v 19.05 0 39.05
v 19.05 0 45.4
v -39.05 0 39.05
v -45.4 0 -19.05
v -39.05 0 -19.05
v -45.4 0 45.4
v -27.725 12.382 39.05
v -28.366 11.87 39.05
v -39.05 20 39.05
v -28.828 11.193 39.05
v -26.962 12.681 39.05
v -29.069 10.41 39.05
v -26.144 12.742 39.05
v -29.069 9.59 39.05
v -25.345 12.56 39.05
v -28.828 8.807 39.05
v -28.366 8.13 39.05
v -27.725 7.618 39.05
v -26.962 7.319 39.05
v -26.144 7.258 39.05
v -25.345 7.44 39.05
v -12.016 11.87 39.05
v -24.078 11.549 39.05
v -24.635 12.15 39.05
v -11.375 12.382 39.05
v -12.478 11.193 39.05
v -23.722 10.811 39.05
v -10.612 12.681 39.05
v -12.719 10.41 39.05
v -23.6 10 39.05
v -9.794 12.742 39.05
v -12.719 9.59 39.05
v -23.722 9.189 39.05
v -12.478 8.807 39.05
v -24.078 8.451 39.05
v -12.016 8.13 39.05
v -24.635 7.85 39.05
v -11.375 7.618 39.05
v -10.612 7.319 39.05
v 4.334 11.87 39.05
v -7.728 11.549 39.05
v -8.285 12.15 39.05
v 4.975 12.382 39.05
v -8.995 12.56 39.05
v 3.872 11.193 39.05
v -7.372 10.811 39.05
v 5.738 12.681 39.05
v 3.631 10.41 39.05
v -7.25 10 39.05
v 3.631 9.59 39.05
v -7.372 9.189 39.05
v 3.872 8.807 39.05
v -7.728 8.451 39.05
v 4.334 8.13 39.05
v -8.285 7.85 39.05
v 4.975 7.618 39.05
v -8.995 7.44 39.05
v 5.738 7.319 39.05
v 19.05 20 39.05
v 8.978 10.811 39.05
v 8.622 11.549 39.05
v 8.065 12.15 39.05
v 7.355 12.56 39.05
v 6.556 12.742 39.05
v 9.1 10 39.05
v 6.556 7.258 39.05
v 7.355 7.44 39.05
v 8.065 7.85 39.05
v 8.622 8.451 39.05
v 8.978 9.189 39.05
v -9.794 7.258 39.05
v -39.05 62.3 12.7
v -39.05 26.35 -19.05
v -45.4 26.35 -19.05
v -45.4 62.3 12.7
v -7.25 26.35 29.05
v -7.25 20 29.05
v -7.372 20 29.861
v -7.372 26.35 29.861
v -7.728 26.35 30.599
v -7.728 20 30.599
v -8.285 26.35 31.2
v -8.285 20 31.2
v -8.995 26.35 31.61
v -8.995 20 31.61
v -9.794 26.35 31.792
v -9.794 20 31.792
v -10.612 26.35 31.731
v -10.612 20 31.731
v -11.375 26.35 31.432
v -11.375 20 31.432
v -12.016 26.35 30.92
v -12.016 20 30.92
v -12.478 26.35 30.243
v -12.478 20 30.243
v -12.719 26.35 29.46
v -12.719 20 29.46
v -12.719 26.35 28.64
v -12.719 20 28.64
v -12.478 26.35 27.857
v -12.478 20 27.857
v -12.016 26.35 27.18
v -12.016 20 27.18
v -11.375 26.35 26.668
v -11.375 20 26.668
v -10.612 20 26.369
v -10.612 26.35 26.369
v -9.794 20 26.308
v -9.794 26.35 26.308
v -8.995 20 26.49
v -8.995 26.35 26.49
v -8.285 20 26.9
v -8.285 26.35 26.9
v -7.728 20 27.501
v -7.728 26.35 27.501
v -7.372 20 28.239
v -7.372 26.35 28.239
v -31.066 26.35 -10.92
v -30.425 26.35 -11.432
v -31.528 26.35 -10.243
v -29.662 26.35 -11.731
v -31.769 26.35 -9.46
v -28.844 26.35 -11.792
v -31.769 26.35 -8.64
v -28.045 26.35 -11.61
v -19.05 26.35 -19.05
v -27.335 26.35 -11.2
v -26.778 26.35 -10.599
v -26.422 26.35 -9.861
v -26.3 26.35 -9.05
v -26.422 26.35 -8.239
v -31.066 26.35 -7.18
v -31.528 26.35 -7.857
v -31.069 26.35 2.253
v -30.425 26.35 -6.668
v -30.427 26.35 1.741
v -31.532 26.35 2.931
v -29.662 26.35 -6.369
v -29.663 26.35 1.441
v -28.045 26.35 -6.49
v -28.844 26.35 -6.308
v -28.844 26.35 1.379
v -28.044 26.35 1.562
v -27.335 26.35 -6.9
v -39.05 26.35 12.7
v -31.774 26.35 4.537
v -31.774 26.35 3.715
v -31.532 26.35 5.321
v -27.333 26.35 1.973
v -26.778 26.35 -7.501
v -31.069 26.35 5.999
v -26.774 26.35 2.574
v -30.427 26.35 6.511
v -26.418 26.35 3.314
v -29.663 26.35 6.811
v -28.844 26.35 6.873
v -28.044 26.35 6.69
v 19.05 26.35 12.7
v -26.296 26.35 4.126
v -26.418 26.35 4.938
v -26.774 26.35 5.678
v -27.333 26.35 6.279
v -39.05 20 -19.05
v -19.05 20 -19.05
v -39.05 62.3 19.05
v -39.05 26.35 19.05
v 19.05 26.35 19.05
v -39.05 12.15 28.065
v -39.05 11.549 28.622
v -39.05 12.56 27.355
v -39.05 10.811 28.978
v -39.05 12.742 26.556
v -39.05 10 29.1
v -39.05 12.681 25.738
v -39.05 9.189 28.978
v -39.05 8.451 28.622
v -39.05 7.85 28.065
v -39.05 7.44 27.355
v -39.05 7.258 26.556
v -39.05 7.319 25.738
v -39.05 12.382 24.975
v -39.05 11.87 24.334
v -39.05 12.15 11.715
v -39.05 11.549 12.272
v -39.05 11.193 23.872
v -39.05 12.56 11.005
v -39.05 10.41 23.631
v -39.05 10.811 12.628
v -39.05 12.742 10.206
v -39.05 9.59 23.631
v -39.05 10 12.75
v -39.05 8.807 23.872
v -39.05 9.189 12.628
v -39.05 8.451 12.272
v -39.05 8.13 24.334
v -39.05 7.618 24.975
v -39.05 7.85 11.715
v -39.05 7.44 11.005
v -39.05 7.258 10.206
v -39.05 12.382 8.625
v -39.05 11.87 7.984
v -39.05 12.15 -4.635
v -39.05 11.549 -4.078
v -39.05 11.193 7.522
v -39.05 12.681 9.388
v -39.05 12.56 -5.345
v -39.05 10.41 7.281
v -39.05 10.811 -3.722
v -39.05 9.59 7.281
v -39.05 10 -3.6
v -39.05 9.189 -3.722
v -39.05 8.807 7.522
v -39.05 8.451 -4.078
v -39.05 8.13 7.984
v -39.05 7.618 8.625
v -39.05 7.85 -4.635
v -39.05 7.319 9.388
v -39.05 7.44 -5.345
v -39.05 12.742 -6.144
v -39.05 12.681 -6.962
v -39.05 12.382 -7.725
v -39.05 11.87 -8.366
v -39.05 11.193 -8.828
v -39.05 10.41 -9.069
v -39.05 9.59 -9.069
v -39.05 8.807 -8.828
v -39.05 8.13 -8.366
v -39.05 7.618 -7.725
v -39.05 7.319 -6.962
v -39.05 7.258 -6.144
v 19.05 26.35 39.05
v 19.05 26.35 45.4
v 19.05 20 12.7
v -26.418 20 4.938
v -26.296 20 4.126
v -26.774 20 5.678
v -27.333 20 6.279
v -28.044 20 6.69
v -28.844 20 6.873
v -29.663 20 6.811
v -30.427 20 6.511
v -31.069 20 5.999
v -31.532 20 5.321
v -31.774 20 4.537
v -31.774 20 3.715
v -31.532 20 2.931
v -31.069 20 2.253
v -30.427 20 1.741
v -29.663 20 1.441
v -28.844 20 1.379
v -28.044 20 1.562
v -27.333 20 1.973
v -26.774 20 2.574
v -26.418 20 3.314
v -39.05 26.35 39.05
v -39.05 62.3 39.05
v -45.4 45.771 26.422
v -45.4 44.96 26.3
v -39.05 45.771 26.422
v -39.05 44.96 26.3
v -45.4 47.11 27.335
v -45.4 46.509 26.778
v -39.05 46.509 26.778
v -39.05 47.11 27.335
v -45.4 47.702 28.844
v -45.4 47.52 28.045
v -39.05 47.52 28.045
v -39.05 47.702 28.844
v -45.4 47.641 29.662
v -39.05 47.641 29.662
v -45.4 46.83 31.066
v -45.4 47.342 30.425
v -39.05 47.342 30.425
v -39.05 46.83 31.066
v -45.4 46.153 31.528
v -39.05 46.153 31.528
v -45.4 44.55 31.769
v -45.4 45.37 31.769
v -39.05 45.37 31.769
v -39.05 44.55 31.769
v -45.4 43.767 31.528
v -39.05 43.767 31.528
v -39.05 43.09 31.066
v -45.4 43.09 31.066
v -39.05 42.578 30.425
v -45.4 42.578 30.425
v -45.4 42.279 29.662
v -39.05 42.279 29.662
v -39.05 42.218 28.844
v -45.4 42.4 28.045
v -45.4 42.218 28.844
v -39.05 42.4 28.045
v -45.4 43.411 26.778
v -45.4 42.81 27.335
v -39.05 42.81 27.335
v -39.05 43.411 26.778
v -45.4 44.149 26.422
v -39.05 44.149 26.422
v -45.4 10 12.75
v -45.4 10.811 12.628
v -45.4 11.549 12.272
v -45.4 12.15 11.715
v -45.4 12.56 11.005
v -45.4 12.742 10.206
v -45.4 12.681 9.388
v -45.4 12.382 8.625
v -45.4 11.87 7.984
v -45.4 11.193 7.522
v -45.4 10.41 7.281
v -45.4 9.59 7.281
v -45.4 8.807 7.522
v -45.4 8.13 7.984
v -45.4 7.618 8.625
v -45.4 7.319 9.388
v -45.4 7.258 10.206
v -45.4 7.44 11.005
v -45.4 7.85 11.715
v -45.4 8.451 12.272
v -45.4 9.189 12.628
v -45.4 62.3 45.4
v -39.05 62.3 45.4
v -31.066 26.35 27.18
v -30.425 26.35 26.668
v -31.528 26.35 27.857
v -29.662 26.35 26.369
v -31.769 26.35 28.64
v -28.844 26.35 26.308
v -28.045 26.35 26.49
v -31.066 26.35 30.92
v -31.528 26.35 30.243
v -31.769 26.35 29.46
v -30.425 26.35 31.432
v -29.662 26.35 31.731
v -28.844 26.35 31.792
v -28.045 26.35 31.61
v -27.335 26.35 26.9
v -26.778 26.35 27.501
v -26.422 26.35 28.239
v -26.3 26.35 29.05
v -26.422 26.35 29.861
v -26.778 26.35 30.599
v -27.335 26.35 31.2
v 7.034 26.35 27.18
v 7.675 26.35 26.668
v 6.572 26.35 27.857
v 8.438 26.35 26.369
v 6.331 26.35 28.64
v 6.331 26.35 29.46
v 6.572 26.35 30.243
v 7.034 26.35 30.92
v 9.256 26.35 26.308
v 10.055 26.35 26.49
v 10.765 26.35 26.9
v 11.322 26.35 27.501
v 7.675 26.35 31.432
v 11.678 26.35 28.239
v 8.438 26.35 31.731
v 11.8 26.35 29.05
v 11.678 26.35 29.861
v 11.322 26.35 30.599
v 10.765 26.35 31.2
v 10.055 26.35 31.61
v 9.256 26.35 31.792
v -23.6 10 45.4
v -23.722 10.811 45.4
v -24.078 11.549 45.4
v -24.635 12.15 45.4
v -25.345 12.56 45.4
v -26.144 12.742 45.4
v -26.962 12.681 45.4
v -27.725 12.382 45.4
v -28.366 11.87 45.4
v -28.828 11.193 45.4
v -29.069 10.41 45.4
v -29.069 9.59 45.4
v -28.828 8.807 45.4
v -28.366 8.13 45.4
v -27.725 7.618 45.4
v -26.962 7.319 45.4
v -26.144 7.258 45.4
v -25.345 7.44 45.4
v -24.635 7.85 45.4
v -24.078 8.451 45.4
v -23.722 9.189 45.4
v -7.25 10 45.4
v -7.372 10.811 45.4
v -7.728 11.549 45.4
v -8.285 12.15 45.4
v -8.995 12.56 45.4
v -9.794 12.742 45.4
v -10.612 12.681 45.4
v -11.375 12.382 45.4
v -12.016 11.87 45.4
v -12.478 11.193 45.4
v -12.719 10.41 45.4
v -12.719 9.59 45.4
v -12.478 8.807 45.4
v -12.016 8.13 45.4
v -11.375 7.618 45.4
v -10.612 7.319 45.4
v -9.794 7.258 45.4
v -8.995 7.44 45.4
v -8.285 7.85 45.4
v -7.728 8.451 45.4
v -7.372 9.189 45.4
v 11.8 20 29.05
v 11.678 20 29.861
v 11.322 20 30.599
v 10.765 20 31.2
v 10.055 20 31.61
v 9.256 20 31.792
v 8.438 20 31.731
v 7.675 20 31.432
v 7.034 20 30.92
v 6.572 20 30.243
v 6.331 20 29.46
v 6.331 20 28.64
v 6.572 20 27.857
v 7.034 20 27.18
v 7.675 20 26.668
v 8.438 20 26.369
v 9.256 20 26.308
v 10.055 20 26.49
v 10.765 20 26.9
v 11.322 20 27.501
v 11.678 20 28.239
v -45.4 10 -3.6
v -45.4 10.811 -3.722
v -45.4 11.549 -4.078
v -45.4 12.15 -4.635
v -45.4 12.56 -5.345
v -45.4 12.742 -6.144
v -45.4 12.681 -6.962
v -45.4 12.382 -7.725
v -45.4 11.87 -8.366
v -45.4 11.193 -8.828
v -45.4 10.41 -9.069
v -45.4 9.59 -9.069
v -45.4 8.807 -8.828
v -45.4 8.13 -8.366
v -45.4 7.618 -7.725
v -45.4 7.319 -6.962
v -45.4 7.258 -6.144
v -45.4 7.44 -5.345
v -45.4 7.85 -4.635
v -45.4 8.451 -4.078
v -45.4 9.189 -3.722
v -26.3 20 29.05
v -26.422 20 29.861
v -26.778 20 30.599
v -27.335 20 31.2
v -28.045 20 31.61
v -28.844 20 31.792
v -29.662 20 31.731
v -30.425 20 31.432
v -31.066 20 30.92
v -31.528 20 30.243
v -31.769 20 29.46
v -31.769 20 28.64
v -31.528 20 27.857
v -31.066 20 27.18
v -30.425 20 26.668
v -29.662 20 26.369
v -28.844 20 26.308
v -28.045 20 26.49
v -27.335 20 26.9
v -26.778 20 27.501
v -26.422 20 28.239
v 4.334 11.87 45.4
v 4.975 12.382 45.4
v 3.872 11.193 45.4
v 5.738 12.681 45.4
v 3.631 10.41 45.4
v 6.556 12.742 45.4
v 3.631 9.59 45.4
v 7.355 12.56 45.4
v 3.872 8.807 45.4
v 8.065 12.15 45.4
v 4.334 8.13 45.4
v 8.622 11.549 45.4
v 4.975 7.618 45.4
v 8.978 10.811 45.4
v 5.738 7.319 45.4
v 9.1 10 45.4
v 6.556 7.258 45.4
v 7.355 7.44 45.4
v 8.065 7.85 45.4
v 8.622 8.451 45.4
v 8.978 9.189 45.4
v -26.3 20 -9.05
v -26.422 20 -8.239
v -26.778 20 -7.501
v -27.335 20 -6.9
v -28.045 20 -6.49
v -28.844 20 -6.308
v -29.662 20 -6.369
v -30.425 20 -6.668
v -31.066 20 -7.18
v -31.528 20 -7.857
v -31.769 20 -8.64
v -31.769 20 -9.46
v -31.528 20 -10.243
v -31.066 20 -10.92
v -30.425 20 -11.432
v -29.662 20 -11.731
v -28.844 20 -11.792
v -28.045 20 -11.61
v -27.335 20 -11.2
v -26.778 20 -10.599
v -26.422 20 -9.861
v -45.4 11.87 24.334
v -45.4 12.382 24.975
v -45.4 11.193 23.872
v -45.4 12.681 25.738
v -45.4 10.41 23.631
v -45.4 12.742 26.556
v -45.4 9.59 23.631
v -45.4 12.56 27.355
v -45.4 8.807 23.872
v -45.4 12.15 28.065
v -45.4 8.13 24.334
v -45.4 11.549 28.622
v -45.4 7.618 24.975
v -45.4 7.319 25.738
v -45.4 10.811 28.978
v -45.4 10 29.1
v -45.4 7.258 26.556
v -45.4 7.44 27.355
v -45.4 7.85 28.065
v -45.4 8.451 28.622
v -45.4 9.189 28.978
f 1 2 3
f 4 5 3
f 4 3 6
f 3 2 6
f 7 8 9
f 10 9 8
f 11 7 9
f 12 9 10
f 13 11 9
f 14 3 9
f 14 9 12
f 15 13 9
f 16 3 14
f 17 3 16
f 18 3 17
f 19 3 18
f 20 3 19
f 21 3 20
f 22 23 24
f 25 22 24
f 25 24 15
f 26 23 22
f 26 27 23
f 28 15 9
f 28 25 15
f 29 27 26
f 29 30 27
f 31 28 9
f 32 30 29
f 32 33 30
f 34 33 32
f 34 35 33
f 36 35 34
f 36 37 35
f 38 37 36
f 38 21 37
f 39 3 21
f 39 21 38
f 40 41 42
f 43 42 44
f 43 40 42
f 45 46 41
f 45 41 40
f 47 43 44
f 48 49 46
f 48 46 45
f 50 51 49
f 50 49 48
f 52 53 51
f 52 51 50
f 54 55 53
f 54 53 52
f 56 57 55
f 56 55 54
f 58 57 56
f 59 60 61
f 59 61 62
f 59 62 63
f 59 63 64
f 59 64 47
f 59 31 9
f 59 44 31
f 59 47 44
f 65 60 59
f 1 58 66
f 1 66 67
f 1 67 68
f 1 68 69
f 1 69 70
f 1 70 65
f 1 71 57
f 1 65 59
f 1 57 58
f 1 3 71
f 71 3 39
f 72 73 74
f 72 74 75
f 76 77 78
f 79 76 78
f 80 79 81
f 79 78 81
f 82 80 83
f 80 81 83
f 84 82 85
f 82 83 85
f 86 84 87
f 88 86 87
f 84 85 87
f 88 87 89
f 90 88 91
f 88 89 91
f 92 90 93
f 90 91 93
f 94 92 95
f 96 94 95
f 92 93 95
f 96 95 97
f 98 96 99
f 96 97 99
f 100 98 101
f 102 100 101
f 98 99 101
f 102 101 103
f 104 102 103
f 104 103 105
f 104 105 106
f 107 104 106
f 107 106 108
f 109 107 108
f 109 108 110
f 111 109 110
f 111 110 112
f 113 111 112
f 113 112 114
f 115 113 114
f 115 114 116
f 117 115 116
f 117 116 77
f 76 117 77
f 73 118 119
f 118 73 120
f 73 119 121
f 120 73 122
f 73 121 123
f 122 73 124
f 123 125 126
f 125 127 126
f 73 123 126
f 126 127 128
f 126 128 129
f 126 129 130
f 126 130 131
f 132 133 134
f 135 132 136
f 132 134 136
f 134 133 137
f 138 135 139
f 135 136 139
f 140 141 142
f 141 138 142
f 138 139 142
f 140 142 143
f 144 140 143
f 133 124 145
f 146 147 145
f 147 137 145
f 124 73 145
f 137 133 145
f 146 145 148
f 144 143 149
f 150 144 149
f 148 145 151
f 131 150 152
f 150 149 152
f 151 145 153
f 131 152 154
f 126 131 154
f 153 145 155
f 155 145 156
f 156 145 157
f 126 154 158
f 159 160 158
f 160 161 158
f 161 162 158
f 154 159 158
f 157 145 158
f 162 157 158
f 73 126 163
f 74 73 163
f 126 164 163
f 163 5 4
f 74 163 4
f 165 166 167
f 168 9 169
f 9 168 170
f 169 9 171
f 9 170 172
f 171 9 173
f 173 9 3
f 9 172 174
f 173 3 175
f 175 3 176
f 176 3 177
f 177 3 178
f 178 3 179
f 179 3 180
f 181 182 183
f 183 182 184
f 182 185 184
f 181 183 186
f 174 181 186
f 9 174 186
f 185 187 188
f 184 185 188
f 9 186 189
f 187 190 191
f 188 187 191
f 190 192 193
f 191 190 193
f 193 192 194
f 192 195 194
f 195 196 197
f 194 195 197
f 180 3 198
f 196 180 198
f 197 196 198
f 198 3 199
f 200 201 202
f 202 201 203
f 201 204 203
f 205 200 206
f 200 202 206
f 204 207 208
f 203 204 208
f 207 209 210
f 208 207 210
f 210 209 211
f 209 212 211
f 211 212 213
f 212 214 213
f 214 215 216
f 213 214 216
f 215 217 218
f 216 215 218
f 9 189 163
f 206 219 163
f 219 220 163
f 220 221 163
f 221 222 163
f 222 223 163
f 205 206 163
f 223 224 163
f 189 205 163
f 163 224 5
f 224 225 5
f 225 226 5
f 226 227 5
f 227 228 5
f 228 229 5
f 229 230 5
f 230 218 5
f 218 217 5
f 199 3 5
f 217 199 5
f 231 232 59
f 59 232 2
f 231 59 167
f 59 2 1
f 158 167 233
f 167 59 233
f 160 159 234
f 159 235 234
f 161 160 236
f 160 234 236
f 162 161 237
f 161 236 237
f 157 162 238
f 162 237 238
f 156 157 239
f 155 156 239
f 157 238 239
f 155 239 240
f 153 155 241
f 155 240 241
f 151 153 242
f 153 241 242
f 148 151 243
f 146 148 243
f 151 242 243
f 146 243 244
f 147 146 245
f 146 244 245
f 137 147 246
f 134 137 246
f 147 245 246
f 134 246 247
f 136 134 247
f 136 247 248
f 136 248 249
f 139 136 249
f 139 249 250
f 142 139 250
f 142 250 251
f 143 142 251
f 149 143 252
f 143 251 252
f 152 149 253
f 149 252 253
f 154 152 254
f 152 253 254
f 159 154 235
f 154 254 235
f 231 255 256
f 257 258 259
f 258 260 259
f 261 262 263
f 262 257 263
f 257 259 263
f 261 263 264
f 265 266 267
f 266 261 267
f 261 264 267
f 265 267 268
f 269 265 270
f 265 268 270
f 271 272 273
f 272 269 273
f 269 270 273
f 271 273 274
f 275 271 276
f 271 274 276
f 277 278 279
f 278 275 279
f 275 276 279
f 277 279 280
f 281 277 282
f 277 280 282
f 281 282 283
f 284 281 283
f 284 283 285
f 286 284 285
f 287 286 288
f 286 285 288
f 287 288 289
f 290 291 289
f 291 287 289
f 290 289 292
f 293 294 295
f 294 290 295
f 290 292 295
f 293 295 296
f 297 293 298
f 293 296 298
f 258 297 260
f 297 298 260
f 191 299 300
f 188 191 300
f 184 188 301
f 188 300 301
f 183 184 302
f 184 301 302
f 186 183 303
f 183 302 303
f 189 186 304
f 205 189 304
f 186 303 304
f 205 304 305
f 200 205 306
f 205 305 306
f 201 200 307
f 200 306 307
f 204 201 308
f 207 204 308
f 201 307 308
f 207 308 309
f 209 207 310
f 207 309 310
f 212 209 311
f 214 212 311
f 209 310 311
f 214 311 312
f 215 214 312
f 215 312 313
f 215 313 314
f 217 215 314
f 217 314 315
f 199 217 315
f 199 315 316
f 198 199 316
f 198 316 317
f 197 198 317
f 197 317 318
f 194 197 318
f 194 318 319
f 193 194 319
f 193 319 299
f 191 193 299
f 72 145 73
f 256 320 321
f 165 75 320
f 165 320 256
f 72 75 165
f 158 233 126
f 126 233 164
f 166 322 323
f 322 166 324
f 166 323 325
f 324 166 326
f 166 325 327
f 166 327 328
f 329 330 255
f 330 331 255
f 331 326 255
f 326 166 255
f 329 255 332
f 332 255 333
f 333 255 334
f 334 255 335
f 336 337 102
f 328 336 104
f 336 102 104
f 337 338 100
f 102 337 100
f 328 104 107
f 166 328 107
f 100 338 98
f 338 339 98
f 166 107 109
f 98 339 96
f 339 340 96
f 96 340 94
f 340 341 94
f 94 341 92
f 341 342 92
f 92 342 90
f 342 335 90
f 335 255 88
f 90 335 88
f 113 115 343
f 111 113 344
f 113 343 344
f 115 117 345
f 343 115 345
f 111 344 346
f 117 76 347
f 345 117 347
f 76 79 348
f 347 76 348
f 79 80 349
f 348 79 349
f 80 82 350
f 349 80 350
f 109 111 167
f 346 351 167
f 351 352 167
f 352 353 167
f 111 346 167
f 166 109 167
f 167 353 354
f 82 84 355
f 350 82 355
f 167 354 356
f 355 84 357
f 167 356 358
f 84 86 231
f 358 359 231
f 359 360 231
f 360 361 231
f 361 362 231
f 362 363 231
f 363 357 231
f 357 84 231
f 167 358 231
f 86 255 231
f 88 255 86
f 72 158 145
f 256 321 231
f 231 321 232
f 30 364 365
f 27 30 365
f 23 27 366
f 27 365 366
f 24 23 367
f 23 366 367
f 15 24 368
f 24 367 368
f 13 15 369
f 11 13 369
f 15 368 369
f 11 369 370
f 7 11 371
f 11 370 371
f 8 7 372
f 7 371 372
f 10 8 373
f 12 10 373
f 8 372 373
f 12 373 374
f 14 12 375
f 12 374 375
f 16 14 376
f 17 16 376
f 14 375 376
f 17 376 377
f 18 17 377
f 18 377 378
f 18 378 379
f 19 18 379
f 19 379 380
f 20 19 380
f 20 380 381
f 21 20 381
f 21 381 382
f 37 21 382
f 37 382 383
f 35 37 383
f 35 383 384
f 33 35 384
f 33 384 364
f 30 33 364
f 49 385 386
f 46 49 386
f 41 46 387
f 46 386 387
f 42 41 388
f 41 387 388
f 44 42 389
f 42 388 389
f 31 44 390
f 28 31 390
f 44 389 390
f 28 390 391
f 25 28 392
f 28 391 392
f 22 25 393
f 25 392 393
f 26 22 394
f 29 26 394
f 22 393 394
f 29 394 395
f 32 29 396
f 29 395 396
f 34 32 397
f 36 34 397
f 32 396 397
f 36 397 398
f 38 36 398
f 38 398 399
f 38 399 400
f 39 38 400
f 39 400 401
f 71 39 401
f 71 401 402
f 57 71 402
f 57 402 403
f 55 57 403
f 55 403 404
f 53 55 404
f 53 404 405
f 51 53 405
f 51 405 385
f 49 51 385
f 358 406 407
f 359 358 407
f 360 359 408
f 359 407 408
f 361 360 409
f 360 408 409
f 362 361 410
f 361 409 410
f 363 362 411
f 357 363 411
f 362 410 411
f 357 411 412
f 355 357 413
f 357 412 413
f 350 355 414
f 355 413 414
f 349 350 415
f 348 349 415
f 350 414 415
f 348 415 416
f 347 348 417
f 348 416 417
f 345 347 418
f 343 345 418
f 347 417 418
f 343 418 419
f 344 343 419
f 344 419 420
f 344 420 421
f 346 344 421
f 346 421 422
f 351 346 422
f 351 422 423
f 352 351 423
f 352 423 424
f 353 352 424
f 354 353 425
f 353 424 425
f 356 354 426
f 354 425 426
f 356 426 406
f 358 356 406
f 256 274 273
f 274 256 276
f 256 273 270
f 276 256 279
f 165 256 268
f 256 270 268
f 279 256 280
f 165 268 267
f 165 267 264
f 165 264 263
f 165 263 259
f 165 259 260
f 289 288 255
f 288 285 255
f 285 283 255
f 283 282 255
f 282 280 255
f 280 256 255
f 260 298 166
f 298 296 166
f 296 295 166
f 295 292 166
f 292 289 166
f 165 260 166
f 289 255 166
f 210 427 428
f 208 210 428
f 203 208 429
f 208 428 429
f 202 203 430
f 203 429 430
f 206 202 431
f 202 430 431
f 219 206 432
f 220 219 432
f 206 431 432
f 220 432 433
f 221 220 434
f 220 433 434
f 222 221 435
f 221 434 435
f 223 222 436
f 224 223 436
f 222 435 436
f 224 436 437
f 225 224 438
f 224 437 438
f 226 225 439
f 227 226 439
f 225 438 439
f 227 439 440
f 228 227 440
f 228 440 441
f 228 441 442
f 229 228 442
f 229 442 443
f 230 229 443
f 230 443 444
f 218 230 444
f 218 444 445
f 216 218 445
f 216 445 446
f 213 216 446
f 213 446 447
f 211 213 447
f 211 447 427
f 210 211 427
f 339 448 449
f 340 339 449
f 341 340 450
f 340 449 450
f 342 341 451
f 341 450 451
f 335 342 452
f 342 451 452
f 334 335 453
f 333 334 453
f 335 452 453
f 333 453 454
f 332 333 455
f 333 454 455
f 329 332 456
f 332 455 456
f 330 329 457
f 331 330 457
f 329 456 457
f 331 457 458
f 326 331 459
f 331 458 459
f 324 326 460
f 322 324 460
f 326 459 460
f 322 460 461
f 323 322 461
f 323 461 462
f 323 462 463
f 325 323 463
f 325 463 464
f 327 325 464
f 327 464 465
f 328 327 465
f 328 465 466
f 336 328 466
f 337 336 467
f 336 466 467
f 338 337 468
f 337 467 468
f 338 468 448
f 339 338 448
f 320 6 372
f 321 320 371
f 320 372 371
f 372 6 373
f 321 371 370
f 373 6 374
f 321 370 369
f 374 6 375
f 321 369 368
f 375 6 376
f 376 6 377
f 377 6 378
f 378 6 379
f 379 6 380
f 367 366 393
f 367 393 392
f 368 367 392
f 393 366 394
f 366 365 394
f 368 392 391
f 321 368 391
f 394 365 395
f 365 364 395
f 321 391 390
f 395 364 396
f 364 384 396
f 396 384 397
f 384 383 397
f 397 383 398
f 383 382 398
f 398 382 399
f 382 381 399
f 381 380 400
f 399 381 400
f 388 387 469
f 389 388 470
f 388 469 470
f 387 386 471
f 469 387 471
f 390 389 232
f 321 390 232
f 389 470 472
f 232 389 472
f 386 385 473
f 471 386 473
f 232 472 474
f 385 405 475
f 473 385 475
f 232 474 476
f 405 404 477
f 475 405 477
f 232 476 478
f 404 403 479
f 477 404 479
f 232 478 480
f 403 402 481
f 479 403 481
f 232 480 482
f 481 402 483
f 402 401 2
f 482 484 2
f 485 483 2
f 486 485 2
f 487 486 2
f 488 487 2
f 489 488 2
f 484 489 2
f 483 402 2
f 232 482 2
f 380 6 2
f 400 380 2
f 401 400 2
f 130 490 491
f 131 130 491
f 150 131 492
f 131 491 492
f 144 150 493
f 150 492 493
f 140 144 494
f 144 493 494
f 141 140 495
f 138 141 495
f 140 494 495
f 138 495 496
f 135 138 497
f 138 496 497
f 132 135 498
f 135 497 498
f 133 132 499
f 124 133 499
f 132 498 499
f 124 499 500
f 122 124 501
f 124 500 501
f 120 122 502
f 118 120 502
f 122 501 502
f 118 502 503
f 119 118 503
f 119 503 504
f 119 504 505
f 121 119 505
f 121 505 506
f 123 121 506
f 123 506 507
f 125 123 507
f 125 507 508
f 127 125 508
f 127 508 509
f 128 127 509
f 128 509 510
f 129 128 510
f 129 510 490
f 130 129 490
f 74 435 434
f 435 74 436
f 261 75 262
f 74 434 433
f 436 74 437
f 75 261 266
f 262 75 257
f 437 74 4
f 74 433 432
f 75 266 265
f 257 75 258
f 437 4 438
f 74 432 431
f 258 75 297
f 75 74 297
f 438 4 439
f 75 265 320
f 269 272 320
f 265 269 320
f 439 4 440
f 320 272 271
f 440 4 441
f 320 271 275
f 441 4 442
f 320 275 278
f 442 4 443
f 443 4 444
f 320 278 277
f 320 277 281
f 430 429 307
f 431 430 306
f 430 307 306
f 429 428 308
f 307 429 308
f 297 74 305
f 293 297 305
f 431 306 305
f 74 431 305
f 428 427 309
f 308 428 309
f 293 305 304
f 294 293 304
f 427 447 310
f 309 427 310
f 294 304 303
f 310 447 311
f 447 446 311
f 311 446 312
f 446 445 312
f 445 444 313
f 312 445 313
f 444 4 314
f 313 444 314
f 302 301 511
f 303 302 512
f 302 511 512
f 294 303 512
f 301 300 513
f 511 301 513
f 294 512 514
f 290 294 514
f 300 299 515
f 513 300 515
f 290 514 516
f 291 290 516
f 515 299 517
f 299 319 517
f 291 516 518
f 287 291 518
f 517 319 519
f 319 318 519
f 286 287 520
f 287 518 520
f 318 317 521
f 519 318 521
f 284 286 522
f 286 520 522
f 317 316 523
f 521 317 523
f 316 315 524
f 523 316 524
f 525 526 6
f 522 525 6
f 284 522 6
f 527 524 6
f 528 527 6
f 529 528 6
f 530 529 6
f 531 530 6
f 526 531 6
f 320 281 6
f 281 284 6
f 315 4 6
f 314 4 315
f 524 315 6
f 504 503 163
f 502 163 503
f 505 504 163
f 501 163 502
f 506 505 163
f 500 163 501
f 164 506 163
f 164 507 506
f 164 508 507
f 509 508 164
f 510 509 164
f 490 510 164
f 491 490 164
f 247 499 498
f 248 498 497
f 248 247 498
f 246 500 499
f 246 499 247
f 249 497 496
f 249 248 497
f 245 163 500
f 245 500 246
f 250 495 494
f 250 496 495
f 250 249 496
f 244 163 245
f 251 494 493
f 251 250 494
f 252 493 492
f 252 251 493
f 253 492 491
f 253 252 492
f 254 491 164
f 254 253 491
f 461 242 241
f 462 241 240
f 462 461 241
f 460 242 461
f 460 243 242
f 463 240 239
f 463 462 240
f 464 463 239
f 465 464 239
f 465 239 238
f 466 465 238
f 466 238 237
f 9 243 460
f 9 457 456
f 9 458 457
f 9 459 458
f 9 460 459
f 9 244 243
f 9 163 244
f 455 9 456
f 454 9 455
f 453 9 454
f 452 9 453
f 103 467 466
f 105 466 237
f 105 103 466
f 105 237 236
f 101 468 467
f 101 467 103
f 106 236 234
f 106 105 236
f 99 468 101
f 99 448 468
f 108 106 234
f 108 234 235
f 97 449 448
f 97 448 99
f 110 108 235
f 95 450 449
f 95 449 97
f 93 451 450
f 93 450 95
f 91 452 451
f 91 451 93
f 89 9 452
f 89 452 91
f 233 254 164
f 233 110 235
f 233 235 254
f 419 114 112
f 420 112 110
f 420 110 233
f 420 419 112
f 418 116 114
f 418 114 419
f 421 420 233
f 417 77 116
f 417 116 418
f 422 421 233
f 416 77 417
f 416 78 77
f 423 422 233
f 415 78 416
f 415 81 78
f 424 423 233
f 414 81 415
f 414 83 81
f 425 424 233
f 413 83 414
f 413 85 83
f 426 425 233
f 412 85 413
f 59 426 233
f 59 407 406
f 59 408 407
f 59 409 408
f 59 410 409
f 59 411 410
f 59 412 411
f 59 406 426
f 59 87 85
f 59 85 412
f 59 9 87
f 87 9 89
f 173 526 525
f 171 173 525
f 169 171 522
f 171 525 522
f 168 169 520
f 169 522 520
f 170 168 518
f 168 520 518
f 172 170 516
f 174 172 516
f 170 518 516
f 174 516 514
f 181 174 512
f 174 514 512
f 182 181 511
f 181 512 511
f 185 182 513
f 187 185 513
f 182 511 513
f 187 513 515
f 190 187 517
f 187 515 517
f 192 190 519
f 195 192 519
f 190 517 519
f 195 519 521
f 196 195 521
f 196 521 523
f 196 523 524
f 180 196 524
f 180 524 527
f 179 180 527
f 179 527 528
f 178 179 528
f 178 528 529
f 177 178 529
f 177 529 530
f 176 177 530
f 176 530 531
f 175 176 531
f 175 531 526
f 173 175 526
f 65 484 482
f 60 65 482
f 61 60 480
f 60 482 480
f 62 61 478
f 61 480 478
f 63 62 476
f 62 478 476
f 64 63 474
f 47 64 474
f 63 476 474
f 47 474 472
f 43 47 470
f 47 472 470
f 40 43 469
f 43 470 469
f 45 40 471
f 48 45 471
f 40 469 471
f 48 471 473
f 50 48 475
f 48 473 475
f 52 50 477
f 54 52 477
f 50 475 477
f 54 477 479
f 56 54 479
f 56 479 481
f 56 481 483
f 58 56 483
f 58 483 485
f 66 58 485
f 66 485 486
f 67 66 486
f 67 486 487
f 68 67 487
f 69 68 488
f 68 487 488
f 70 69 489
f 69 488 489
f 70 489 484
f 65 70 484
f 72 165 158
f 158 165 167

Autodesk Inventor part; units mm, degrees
ref_plane "YZ Plane" through (0, 0, 0) normal (1, 0, 0) x (0, 1, 0)
ref_plane "XZ Plane" through (0, 0, 0) normal (0, 1, 0) x (-1, 0, 0)
sketch "Sketch1" plane through (0, 0, 0) normal (0, 1, 0) x (-1, 0, 0)
  line L0 (-19.05, -19.05) -> (19.05, -19.05) construction
  line L1 (19.05, -19.05) -> (19.05, 19.05) construction
  line L2 (19.05, 19.05) -> (-19.05, 19.05) construction
  line L3 (-19.05, 19.05) -> (-19.05, -19.05) construction
  line L4 (-19.05, -19.05) -> (19.05, 19.05) construction
  line L5 (19.05, -19.05) -> (-19.05, 19.05) construction
  line L6 (-19.05, 19.05) -> (19.05, 19.05) construction
  line L7 (19.05, 19.05) -> (19.05, 39.05) construction
  line L8 (19.05, 39.05) -> (-19.05, 39.05)
  line L9 (-19.05, 39.05) -> (-19.05, 19.05) construction
  line L10 (19.05, 39.05) -> (39.05, 39.05)
  line L11 (39.05, 39.05) -> (39.05, -19.05)
  line L12 (39.05, -19.05) -> (19.05, -19.05) construction
  line L13 (19.05, -19.05) -> (19.05, 19.05) construction
  line L14 (19.05, 19.05) -> (19.05, 39.05) construction
  line L15 (-19.05, 39.05) -> (39.05, 39.05)
  line L16 (45.4, 39.05) -> (45.4, 45.4)
  line L17 (45.4, 45.4) -> (-19.05, 45.4)
  line L18 (-19.05, 45.4) -> (-19.05, 39.05)
  line L19 (45.4, 39.05) -> (39.05, 39.05) construction
  line L20 (39.05, 39.05) -> (39.05, -19.05)
  line L21 (39.05, -19.05) -> (45.4, -19.05)
  line L22 (45.4, -19.05) -> (45.4, 39.05)
  line L23 (39.05, 39.05) -> (45.4, 39.05) construction
  point P0 (0, 0)
  dimension "d0" = 38.1
  dimension "d1" = 20
  dimension "d2" = 20
  dimension "d3" = 6.35
  dimension "d4" = 6.35
  dimension "d67" = 0
extrude "Extrusion1" add sketch "Sketch1" along normal blind 62.3
sketch "Sketch2" plane through (-45.4, 0, 45.4) normal (0, 0, 1) x (1, 0, 0)
  line L0 (6.35, 0) -> (0, 0) projected
  line L1 (64.45, 0) -> (64.45, 62.3) projected
  line L2 (0, 0) -> (64.45, 0)
  line L3 (64.45, 0) -> (64.45, 20)
  line L4 (64.45, 20) -> (0, 20)
  line L5 (0, 20) -> (0, 0)
  line L6 (0, 0) -> (0, 62.3) projected
  line L7 (0, 10) -> (64.45, 10) construction
  circle A0 centre (19.05, 10) radius 2.75
  circle A1 centre (35.4, 10) radius 2.75
  circle A2 centre (51.75, 10) radius 2.75
  point P0 (45.4, 0)
  dimension "d7" = 20
  dimension "d8" = 5.5
  dimension "d12" = 16.35
  dimension "d68" = 12.7
extrude "Extrusion2" cut sketch "Sketch2" against normal blind 62.3 contours A0 | A1 | A2
sketch "Sketch3" plane through (-45.4, 0, -19.05) normal (-1, 0, 0) x (0, 0, 1)
  circle A0 centre (12.7, 10) radius 2.75
  line L0 (0, 0) -> (64.45, 0) projected
  line L1 (0, 0) -> (0, 62.3) projected
  circle A1 centre (29.05, 10) radius 2.75
  circle A2 centre (45.4, 10) radius 2.75
  point P0 (19.05, 0)
  dimension "d19" = 10
  dimension "d20" = 5.5
  dimension "d21" = 12.7
  dimension "d24" = 16.35
extrude "Extrusion3" cut sketch "Sketch3" against normal blind 62.3
ref_plane "Work Plane1" through (0, 20, 0) normal (0, -1, 0) x (1, 0, 0)
sketch "Sketch4" plane through (0, 20, 0) normal (0, -1, 0) x (1, 0, 0)
  line L0 (-39.05, -19.05) -> (-45.4, -19.05) projected
  line L1 (-39.05, 39.05) -> (-39.05, -19.05) projected
  line L2 (19.05, 39.05) -> (-39.05, 39.05) projected
  line L3 (19.05, 45.4) -> (19.05, 39.05) projected
  line L4 (-45.4, 45.4) -> (19.05, 45.4) projected
  line L5 (-45.4, -19.05) -> (-45.4, 45.4) projected
  line L6 (-39.05, 39.05) -> (-39.05, -19.05) projected
  line L7 (-39.05, 39.05) -> (-19.05, 39.05)
  line L8 (-19.05, 39.05) -> (-19.05, 19.05) construction
  line L9 (-19.05, -19.05) -> (-39.05, -19.05)
  line L10 (-39.05, -19.05) -> (-39.05, 39.05)
  line L11 (19.05, 39.05) -> (-39.05, 39.05) projected
  line L12 (19.05, 39.05) -> (-19.05, 39.05)
  line L13 (-19.05, 39.05) -> (-19.05, 19.05) construction
  line L14 (-19.05, 19.05) -> (19.05, 19.05) construction
  line L15 (19.05, 19.05) -> (19.05, 39.05)
  line L16 (-19.05, 19.05) -> (-19.05, -19.05) construction
  line L17 (19.05, 29.05) -> (-39.05, 29.05) construction
  line L18 (-29.05, -19.05) -> (-29.05, 39.05) construction
  circle A0 centre (-29.05, 29.05) radius 2.75
  circle A1 centre (-10, 29.05) radius 2.75
  circle A2 centre (9.05, 29.05) radius 2.75
  circle A3 centre (-29.05, 10) radius 2.75
  circle A4 centre (-29.05, -9.05) radius 2.75
  line L19 (19.05, 19.05) -> (19.05, 12.7)
  line L20 (19.05, 12.7) -> (-19.05, -19.05)
  circle A5 centre (-29.05, 4.126) radius 2.7544
  point P0 (0, 0)
  dimension "d32" = 20
  dimension "d35" = 19.05
  dimension "d40" = 5.5
  dimension "d43" = 19.05
  dimension "d50" = 6.35
  dimension "d69" = 0
extrude "Extrusion4" add sketch "Sketch4" against normal blind 6.35 contours L1 L2 L15 L19 L20 L9 | A3
sketch "Sketch5" plane through (0, 26.35, 0) normal (0, 1, 0) x (1, 0, 0)
  line L0 (19.05, -39.05) -> (19.05, -12.7) projected
  line L1 (-39.05, -39.05) -> (-39.05, 19.05) projected
  line L2 (19.05, -12.7) -> (-39.05, -12.7)
  line L3 (-39.05, -12.7) -> (-39.05, -19.05)
  line L4 (-39.05, -19.05) -> (19.05, -19.05)
  line L5 (19.05, -19.05) -> (19.05, -12.7)
  point P0 (0, 0)
  dimension "d51" = 6.35
extrude "Extrusion5" add sketch "Sketch5" along normal up to surface (35.95 mm away)
sketch "Sketch7" plane through (-39.05, 26.35, -19.05) normal (1, 0, 0) x (0, 0, -1)
  line L0 (-31.75, 35.95) -> (0, 35.95) projected
  line L1 (-31.75, 35.95) -> (0, 35.95)
  line L2 (0, 0) -> (0, 35.95) projected
  line L3 (0, 35.95) -> (0, 0)
  line L4 (0, 0) -> (-31.75, 35.95)
  point P0 (-19.05, -26.35)
extrude "Extrusion7" cut sketch "Sketch7" against normal through all
sketch "Sketch8" plane through (-45.4, 0, 45.4) normal (0, 0, 1) x (1, 0, 0)
  line L0 (64.45, 62.3) -> (6.35, 62.3) projected
  line L1 (6.35, 26.35) -> (6.35, 62.3) projected
  line L2 (64.45, 26.35) -> (6.35, 26.35) projected
  line L3 (64.45, 26.35) -> (64.45, 62.3) projected
  line L4 (64.45, 20) -> (64.45, 26.35) projected
  line L5 (6.35, 62.3) -> (64.45, 26.35)
  line L6 (6.35, 62.3) -> (64.45, 62.3) projected
  line L7 (64.45, 26.35) -> (64.45, 62.3)
  line L8 (64.45, 62.3) -> (6.35, 62.3)
  point P0 (45.4, 0)
extrude "Extrusion8" cut sketch "Sketch8" against normal through all contours L3 L5 L0
sketch "Sketch9" plane through (-39.05, 26.35, 39.05) normal (1, 0, 0) x (0, 0, -1)
  line L0 (12.75, -6.35) -> (7.25, -6.35) projected
  line L1 (10, -6.35) -> (10, 18.61)
  circle A0 centre (10, 18.61) radius 2.75
  point P0 (39.05, -26.35)
  dimension "d63" = 24.96
  dimension "d64" = 5.5
extrude "Extrusion9" cut sketch "Sketch9" against normal through all
properties part number "xIdler"
